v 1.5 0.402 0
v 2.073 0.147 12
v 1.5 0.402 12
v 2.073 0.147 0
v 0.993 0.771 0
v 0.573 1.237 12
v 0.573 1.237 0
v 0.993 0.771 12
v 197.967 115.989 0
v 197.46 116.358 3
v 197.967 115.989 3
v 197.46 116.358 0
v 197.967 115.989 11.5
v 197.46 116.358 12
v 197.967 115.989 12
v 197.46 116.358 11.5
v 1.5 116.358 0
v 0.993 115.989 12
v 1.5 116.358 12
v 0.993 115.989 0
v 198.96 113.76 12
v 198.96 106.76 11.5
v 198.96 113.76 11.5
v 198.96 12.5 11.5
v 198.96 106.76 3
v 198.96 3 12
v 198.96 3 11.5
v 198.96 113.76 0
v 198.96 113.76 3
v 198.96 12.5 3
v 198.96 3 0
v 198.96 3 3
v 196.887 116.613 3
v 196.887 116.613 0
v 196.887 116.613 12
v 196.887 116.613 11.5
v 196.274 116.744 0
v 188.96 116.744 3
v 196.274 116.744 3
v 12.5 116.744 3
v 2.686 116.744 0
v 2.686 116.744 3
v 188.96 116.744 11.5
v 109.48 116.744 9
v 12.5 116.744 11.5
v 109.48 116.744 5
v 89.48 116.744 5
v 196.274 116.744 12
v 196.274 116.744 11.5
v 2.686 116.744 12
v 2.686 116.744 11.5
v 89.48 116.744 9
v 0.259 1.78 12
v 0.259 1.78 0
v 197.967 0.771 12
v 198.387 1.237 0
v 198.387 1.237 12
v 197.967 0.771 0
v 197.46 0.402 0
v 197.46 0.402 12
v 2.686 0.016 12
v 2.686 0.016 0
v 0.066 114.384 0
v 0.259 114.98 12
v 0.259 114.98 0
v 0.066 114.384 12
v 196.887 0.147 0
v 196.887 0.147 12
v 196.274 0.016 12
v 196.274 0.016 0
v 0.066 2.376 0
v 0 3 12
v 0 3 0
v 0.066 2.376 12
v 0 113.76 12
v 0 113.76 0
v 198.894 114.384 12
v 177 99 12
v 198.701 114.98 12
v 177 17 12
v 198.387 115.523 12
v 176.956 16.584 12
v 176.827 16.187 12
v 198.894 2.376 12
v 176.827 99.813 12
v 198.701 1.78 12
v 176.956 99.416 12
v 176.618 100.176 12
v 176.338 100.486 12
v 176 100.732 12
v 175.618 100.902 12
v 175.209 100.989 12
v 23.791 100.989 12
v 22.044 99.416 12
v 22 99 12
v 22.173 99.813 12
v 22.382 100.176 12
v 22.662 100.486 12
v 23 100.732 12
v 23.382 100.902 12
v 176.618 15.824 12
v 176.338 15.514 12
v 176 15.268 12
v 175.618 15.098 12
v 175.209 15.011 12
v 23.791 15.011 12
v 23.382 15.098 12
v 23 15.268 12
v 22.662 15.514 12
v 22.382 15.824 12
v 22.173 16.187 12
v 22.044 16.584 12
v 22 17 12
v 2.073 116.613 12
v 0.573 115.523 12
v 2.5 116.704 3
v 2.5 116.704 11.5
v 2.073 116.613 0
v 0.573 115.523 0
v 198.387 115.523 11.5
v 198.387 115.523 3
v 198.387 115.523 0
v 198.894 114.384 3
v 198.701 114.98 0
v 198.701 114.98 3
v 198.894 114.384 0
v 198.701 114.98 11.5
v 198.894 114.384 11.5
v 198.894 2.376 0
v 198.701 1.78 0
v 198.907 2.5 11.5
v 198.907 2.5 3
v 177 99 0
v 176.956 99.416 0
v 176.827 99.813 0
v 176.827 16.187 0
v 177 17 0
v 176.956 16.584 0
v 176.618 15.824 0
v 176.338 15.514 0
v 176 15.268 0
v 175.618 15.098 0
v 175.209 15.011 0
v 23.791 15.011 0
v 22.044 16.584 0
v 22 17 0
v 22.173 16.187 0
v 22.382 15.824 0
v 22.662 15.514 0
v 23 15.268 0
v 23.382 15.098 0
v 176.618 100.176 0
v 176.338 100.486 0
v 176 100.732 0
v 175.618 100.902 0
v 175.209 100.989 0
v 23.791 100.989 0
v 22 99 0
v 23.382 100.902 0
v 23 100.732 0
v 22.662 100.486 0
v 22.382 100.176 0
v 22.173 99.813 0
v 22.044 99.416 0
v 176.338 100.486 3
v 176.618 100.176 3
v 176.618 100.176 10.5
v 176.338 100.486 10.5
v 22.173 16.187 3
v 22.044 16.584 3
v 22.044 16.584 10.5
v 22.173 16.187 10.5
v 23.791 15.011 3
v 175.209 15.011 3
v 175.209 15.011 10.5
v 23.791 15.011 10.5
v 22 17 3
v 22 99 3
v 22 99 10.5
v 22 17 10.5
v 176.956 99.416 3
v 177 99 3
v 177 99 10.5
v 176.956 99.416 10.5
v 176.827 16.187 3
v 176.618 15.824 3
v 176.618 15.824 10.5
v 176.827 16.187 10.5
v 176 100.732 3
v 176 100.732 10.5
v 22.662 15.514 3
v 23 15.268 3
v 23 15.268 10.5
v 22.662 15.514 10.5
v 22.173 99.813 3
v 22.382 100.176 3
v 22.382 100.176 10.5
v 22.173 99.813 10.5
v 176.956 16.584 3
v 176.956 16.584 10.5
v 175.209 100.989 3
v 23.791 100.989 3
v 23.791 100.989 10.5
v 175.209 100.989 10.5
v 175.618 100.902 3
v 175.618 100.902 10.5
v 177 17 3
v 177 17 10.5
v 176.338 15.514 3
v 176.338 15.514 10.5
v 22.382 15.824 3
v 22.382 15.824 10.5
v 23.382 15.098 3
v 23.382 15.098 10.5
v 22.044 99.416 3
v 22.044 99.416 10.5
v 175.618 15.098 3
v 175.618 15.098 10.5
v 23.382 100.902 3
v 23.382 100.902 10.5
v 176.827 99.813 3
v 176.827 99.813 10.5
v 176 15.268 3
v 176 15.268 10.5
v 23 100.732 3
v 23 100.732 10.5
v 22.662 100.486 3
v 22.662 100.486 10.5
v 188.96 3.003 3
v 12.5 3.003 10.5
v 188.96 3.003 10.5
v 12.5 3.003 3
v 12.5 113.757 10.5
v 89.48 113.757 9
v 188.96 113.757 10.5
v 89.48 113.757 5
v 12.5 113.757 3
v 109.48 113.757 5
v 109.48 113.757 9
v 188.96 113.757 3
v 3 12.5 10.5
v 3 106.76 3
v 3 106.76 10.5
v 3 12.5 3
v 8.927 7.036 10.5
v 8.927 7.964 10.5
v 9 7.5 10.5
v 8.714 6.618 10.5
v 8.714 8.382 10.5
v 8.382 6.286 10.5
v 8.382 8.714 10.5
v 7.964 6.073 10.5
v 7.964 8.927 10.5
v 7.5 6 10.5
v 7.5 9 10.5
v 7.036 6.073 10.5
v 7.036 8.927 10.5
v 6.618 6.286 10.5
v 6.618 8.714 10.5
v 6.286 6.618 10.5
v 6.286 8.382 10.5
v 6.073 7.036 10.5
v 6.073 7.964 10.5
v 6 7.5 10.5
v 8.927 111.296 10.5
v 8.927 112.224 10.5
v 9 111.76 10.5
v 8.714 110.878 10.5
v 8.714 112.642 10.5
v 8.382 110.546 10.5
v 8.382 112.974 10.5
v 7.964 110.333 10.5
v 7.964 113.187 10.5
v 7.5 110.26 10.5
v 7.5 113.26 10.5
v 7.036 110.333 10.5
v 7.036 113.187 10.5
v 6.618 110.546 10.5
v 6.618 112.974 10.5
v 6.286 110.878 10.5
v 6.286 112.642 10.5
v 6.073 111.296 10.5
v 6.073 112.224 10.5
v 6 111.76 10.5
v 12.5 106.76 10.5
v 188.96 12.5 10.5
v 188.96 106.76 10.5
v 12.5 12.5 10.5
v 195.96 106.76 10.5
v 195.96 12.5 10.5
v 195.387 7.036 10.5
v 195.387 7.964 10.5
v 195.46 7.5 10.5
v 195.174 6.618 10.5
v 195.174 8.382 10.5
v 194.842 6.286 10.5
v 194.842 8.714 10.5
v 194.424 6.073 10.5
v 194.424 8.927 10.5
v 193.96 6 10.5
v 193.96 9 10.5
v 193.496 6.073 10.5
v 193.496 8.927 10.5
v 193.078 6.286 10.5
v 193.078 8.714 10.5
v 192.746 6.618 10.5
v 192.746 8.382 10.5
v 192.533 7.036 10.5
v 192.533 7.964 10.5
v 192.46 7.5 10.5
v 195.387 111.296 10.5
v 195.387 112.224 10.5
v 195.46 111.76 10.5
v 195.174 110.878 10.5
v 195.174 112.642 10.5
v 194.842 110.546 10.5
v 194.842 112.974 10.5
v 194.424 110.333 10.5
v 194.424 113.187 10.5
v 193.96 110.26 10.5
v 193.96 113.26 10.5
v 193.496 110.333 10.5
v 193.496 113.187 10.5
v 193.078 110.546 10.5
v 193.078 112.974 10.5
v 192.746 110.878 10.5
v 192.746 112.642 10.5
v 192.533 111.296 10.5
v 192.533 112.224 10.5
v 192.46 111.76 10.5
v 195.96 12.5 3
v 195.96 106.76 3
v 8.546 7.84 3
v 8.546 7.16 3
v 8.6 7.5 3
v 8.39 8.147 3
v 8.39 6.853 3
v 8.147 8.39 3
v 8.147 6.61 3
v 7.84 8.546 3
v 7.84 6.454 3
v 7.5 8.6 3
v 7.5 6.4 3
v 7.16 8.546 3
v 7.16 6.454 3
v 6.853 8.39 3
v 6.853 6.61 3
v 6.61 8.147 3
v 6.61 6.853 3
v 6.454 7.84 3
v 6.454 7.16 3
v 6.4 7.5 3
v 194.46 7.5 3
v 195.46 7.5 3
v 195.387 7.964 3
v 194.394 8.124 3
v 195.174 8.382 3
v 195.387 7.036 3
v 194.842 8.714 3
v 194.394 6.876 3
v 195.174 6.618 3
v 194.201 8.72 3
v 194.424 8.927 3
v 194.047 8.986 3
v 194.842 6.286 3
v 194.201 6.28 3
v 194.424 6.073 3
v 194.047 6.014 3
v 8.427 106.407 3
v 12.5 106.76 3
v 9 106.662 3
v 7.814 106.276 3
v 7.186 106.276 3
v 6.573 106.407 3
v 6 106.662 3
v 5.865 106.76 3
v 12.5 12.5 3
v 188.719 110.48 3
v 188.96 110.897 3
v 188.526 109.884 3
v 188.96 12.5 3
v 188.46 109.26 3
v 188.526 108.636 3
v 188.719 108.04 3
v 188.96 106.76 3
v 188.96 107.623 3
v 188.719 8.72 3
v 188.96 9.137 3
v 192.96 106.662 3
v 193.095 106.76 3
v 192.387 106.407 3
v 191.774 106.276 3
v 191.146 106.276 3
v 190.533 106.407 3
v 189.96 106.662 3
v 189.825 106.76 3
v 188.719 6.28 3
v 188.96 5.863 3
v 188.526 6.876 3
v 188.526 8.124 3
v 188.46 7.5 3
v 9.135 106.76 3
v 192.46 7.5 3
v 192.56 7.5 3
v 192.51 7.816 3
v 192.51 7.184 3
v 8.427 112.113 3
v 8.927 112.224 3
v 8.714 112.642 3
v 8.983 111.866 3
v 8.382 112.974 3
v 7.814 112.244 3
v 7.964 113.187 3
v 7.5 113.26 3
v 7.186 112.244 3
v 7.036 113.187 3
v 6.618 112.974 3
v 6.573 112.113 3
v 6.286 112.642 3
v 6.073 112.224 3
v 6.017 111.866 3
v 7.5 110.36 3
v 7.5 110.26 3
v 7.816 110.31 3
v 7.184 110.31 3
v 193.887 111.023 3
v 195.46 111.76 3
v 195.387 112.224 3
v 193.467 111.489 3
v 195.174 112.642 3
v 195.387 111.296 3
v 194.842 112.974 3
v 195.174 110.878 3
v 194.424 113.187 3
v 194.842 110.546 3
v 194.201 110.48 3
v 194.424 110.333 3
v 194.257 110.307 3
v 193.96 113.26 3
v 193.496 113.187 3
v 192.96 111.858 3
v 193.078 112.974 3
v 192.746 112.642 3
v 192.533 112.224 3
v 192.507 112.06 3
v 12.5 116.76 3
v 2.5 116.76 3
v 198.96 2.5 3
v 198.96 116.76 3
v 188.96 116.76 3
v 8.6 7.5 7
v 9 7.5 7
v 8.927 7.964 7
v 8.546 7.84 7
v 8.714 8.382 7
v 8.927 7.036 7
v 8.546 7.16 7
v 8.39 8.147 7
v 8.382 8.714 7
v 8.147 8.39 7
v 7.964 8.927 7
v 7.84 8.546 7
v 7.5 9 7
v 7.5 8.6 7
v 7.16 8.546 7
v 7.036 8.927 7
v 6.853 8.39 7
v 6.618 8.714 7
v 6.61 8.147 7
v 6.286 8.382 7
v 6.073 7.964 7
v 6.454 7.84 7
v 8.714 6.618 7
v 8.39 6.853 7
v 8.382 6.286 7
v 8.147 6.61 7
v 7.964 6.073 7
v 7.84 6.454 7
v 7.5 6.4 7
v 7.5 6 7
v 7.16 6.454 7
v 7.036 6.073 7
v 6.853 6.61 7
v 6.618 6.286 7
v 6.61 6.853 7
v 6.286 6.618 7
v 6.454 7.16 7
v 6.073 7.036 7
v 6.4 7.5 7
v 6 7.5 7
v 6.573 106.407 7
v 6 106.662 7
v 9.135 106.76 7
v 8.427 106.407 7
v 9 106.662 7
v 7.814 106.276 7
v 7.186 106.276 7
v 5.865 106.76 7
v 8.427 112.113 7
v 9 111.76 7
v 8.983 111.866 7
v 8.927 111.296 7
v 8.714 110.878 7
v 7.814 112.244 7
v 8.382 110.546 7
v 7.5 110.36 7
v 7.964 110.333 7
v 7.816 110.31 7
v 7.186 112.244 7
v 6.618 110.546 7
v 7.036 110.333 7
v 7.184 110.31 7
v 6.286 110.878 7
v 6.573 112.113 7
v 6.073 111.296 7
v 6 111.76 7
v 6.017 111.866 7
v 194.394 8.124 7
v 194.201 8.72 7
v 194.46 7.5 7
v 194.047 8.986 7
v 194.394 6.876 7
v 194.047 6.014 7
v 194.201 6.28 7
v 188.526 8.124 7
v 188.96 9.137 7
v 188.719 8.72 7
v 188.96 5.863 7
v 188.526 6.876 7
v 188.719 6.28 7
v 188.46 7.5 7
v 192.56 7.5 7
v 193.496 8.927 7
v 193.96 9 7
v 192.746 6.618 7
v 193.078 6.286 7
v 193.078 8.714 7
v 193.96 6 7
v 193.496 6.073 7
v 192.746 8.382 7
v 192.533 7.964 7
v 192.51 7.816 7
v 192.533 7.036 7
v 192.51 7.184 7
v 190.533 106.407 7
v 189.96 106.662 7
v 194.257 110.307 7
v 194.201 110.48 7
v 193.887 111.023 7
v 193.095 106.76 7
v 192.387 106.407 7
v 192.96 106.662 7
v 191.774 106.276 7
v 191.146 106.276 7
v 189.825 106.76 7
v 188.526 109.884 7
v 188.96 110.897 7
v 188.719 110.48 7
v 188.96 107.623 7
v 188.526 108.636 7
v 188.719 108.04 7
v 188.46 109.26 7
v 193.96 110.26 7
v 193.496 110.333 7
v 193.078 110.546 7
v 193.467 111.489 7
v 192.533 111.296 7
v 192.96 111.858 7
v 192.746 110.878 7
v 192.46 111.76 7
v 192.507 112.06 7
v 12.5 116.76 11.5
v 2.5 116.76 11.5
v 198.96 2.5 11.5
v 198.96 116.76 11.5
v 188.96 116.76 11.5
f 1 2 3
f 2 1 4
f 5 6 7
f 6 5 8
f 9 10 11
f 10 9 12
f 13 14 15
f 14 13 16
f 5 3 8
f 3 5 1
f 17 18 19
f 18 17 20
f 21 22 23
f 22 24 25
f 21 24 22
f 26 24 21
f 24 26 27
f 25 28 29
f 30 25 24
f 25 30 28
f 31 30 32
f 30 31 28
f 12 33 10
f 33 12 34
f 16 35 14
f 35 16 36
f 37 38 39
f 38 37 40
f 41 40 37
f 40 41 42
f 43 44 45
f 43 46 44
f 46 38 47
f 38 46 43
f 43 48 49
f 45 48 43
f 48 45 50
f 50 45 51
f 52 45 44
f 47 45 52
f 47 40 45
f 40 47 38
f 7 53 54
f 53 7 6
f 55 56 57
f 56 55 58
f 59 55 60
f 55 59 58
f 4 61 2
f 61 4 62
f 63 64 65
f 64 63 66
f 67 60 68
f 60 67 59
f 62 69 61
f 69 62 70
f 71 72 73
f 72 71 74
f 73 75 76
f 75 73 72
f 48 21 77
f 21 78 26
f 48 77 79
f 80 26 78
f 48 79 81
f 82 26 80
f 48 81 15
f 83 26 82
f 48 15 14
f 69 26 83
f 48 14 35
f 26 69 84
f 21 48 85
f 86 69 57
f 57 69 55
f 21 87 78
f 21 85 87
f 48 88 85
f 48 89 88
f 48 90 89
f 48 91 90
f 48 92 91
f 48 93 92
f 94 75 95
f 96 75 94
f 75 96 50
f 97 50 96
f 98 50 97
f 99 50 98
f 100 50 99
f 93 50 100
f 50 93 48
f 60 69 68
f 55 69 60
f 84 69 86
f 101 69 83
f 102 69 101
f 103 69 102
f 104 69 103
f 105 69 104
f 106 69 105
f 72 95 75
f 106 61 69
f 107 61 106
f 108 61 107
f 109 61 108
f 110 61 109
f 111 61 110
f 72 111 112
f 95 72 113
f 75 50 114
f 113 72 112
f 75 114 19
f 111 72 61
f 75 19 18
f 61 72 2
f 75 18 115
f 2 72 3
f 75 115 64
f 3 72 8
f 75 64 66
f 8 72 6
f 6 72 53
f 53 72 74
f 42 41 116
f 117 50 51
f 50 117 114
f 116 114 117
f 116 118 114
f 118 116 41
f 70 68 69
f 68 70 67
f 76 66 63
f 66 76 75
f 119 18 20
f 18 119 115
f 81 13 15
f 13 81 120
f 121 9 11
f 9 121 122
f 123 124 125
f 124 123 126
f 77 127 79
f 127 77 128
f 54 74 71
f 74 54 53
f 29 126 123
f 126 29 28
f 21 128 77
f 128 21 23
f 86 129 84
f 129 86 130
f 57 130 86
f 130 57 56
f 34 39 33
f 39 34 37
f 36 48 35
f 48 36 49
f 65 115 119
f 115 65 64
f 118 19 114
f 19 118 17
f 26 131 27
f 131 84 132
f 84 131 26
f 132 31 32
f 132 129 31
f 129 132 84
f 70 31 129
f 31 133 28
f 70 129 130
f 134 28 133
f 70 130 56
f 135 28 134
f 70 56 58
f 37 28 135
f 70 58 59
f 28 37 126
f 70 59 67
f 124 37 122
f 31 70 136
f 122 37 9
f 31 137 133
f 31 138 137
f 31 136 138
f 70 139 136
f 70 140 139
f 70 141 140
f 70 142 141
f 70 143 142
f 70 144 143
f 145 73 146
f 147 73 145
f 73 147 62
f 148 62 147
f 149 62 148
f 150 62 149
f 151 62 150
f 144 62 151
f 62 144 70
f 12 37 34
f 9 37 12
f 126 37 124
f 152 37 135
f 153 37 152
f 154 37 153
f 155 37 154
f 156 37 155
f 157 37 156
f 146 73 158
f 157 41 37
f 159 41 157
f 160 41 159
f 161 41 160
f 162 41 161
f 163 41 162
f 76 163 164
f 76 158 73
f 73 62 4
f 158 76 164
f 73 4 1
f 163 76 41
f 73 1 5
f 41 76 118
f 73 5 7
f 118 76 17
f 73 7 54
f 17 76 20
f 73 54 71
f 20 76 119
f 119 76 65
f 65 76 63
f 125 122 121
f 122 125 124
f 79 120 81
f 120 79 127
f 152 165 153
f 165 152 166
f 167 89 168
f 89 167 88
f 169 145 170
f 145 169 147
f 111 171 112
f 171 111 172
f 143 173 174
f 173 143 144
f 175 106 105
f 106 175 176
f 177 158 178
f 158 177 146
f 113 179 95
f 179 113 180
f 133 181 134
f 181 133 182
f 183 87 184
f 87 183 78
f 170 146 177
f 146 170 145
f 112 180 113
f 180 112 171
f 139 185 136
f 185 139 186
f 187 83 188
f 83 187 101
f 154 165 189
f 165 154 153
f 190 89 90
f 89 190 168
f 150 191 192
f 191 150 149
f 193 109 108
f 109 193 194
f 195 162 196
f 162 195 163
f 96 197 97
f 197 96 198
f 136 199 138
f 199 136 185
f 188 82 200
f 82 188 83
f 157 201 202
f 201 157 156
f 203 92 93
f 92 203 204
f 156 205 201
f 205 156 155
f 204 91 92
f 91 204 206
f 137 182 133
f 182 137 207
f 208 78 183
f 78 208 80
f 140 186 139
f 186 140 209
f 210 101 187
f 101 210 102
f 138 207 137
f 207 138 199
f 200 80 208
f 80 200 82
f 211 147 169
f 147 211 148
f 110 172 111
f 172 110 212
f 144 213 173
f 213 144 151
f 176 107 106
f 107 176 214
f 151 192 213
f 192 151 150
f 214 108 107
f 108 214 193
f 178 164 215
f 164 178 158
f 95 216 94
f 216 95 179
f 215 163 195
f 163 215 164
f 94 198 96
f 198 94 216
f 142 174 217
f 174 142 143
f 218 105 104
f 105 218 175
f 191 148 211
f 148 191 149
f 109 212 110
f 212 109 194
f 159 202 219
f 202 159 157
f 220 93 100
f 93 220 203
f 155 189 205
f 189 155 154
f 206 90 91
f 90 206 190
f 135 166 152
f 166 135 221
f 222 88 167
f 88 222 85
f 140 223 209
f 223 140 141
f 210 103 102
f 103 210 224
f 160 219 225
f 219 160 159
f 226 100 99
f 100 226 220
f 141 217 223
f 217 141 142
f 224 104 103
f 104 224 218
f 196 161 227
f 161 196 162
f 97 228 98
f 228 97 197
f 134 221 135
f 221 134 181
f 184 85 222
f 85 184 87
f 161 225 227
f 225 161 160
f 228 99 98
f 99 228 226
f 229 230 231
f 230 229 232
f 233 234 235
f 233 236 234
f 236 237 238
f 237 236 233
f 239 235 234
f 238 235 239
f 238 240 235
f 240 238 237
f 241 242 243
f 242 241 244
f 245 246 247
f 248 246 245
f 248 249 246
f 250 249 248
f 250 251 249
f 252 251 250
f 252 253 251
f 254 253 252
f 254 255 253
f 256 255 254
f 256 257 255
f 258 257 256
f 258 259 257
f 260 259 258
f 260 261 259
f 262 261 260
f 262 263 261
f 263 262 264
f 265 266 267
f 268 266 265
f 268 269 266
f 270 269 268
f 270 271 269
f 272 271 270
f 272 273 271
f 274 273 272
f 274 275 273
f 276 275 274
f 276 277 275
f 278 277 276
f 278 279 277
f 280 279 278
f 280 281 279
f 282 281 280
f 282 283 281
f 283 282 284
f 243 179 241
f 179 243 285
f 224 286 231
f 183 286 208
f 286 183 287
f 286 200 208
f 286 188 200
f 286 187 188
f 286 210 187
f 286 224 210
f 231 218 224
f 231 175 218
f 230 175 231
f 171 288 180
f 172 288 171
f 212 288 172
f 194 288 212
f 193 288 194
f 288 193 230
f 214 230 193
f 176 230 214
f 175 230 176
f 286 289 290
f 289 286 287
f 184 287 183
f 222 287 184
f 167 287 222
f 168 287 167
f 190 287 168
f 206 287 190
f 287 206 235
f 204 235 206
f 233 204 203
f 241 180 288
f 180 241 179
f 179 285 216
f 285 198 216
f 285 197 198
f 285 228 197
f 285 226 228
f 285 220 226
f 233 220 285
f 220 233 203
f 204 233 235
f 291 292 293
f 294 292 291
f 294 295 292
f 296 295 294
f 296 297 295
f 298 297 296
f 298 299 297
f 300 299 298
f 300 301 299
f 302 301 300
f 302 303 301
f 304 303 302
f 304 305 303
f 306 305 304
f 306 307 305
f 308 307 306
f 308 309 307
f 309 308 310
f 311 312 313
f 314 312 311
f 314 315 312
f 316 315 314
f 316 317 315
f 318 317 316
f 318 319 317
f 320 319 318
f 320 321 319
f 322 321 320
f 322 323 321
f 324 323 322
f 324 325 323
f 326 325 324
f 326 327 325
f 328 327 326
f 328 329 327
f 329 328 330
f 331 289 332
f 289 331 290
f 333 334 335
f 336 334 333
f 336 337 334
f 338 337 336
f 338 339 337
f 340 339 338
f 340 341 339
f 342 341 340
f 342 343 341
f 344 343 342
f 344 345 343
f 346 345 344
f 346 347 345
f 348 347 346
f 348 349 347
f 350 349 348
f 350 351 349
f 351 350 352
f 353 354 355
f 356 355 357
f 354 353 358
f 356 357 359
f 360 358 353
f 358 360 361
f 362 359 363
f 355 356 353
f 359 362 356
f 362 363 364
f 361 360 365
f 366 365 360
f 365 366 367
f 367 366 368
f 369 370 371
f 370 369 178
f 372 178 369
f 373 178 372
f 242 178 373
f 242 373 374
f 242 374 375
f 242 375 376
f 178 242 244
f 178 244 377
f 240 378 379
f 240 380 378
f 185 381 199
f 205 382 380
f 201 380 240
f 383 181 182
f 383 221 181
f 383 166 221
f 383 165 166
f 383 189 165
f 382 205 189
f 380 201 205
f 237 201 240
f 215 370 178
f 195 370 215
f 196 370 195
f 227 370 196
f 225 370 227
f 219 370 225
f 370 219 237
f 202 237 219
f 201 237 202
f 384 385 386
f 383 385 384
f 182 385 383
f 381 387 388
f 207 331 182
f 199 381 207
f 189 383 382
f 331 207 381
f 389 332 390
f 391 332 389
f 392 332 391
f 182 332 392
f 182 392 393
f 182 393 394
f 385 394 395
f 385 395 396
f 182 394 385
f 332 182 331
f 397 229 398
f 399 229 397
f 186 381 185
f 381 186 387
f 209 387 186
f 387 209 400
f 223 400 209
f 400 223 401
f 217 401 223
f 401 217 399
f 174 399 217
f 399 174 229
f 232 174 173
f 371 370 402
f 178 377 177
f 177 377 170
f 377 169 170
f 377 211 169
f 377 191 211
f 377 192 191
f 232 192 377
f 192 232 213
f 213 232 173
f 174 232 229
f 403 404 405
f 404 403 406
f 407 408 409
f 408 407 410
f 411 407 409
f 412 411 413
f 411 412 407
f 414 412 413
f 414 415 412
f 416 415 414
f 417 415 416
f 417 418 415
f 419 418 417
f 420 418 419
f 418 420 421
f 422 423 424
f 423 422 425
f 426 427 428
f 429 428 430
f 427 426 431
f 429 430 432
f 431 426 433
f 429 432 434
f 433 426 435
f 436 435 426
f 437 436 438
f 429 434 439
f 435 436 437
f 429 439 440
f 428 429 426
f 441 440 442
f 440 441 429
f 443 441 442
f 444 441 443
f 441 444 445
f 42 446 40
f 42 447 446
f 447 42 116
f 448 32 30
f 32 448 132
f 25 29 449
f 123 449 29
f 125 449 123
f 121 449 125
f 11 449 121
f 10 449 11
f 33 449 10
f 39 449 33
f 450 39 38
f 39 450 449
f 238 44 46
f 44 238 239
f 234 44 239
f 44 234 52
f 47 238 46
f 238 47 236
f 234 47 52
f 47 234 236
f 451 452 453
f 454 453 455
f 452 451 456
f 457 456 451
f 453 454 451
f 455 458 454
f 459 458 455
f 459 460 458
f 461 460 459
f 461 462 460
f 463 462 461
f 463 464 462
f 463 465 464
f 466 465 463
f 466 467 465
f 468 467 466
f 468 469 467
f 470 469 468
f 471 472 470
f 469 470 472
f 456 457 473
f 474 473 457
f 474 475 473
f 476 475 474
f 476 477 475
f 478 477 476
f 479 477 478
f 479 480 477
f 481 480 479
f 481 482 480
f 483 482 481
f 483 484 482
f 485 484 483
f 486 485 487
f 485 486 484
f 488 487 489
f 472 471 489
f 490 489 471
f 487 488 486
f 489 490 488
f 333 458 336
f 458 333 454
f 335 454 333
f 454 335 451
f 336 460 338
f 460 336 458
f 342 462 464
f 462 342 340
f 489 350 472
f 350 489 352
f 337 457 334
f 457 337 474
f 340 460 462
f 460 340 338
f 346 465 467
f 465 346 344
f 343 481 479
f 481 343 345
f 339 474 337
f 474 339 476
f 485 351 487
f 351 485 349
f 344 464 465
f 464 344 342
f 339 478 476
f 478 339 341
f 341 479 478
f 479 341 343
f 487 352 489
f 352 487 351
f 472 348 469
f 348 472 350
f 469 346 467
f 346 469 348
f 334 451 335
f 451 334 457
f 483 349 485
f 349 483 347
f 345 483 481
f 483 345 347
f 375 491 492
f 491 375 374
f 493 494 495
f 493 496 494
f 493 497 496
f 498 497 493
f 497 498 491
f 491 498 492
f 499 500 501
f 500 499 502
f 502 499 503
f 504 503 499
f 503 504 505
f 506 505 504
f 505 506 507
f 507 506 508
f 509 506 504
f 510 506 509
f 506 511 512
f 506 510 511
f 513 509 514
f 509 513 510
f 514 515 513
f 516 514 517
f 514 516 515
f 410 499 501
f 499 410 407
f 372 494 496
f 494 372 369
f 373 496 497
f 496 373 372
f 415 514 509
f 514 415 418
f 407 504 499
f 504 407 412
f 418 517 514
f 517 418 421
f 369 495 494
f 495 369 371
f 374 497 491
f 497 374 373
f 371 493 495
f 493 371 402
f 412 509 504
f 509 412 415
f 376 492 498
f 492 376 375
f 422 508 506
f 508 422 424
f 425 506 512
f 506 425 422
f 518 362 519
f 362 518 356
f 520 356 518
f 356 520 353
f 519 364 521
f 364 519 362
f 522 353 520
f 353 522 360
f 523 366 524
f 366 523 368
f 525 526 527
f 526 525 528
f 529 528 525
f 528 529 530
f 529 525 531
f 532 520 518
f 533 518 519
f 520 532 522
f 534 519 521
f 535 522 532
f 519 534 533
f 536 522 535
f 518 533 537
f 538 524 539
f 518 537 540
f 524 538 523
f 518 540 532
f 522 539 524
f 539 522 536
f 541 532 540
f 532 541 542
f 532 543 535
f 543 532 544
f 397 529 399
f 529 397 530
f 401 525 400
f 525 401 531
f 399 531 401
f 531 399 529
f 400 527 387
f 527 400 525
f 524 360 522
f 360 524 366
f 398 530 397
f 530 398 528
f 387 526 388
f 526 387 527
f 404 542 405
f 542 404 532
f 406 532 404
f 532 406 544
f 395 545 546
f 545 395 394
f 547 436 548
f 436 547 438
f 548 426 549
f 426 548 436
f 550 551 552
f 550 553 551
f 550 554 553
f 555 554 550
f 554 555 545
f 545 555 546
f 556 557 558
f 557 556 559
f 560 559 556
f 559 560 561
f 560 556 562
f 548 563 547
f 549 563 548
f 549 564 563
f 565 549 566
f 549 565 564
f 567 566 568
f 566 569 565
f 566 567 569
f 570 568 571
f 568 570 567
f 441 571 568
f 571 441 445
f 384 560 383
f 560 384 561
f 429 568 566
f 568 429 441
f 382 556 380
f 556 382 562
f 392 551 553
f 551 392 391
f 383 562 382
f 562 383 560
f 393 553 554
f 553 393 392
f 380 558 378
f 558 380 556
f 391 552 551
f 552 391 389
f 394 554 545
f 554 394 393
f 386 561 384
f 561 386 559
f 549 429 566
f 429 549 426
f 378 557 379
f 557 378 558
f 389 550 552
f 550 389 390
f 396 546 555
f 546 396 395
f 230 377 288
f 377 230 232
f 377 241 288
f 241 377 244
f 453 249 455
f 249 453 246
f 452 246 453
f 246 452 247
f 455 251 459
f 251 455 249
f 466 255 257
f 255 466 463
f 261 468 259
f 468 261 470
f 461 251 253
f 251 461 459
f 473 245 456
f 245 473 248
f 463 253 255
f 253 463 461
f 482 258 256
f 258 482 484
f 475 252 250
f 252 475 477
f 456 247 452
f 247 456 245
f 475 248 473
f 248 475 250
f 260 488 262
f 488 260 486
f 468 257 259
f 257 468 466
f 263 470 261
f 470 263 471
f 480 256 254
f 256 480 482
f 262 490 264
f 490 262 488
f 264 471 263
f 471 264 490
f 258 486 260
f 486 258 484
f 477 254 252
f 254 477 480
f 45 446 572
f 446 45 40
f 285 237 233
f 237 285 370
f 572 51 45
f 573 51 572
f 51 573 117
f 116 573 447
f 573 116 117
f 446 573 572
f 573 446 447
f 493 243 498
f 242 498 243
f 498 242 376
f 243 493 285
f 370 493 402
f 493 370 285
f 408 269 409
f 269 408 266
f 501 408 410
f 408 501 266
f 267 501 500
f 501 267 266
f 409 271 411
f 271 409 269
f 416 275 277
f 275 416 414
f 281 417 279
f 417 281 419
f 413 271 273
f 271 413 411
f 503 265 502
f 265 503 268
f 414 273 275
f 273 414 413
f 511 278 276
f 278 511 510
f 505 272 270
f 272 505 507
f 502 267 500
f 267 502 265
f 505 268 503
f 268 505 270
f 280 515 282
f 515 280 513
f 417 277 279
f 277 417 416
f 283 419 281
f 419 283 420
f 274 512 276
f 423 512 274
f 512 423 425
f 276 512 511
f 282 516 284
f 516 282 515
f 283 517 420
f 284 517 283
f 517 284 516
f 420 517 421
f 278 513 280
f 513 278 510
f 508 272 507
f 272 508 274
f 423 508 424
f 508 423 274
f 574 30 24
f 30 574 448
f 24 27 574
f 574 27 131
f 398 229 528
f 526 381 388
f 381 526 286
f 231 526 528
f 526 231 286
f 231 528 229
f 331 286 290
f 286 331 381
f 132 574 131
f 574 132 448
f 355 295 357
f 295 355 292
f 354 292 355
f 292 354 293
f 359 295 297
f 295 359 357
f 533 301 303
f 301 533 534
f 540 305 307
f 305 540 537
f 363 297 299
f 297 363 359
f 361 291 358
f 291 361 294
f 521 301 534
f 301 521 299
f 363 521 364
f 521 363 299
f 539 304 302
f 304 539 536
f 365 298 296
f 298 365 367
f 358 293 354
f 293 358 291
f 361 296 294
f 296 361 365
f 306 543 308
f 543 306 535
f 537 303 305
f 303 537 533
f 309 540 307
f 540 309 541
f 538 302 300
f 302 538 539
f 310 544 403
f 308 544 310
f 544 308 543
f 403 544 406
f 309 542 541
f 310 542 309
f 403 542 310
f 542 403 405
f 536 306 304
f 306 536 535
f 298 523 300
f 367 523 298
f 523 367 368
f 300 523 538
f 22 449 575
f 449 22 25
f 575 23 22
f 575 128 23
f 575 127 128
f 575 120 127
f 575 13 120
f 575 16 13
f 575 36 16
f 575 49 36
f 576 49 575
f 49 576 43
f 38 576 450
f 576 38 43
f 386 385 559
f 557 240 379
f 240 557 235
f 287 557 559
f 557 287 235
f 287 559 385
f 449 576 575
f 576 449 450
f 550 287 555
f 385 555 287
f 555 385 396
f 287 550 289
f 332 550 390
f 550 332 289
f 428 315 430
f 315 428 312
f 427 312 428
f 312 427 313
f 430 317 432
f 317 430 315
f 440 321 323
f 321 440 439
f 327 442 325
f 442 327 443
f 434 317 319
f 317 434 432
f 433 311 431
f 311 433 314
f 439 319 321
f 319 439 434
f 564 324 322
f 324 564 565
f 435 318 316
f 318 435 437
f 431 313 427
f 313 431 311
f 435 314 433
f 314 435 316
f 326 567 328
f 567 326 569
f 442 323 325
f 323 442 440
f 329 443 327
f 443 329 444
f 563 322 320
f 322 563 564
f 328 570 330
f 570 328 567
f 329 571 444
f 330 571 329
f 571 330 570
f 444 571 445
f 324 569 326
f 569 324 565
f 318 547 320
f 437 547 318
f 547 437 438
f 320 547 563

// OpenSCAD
// Top Case for Raspberry Pi Touch Display 2
// Designed to hold the 7" touchscreen display

// Display dimensions (Raspberry Pi Touch Display 2)
display_length = 192.96;
display_width = 110.76;
display_thickness = 6.5; // PCB thickness
screen_length = 155;
screen_width = 86;
screen_offset_x = 19; // Distance from left edge to screen
screen_offset_y = 12; // Distance from top edge to screen

// Display mounting holes (relative to corner)
display_mounting_holes = [
    [4.5, 4.5],
    [4.5, 106.26],
    [188.46, 4.5],
    [188.46, 106.26]
];

// Case parameters
wall_thickness = 2.5;
front_bezel = 3; // Bezel around screen
case_tolerance = 0.5;
corner_radius = 3;

// Mounting post parameters
post_diameter = 6;
post_height = 4;
screw_hole_diameter = 2.2; // For M2.5 screws

// Calculate case dimensions
case_length = display_length + 2 * wall_thickness + 2 * case_tolerance;
case_width = display_width + 2 * wall_thickness + 2 * case_tolerance;
case_depth = display_thickness + front_bezel + wall_thickness;

module rounded_cube(size, radius) {
    hull() {
        for (x = [radius, size[0] - radius]) {
            for (y = [radius, size[1] - radius]) {
                translate([x, y, 0])
                    cylinder(h = size[2], r = radius, $fn = 30);
            }
        }
    }
}

module mounting_post(height, outer_d, inner_d) {
    difference() {
        cylinder(h = height, d = outer_d, $fn = 30);
        translate([0, 0, -0.5])
            cylinder(h = height + 1, d = inner_d, $fn = 20);
    }
}

module top_case() {
    difference() {
        // Main case body
        rounded_cube([case_length, case_width, case_depth], corner_radius);
        
        // Screen cutout
        translate([
            wall_thickness + case_tolerance + screen_offset_x, 
            wall_thickness + case_tolerance + screen_offset_y, 
            -1
        ])
            rounded_cube([screen_length, screen_width, case_depth + 2], 2);
        
        // Display pocket (recessed area for display PCB)
        translate([wall_thickness + case_tolerance, wall_thickness + case_tolerance, front_bezel])
            rounded_cube([
                display_length, 
                display_width, 
                display_thickness + 1
            ], corner_radius - wall_thickness);
        
        // Cable access hole (for display cable)
        translate([case_length/2 - 10, case_width - wall_thickness - 1, front_bezel + 2])
            cube([20, wall_thickness + 2, 4]);
    }
    
    // Add mounting posts for display
    for (hole = display_mounting_holes) {
        translate([
            wall_thickness + case_tolerance + hole[0], 
            wall_thickness + case_tolerance + hole[1], 
            front_bezel
        ])
            mounting_post(post_height, post_diameter, screw_hole_diameter);
    }
    
    // Add corner reinforcements
    corner_reinforcement_size = 10;
    corner_reinforcement_height = case_depth - front_bezel - 0.5;
    
    for (x = [0, 1]) {
        for (y = [0, 1]) {
            translate([
                x * (case_length - corner_reinforcement_size - wall_thickness) + wall_thickness,
                y * (case_width - corner_reinforcement_size - wall_thickness) + wall_thickness,
                front_bezel
            ])
            difference() {
                cube([corner_reinforcement_size, corner_reinforcement_size, corner_reinforcement_height]);
                translate([corner_reinforcement_size/2, corner_reinforcement_size/2, -1])
                    cylinder(h = corner_reinforcement_height + 2, d = 3, $fn = 20);
            }
        }
    }
}

// Render the top case
top_case();
